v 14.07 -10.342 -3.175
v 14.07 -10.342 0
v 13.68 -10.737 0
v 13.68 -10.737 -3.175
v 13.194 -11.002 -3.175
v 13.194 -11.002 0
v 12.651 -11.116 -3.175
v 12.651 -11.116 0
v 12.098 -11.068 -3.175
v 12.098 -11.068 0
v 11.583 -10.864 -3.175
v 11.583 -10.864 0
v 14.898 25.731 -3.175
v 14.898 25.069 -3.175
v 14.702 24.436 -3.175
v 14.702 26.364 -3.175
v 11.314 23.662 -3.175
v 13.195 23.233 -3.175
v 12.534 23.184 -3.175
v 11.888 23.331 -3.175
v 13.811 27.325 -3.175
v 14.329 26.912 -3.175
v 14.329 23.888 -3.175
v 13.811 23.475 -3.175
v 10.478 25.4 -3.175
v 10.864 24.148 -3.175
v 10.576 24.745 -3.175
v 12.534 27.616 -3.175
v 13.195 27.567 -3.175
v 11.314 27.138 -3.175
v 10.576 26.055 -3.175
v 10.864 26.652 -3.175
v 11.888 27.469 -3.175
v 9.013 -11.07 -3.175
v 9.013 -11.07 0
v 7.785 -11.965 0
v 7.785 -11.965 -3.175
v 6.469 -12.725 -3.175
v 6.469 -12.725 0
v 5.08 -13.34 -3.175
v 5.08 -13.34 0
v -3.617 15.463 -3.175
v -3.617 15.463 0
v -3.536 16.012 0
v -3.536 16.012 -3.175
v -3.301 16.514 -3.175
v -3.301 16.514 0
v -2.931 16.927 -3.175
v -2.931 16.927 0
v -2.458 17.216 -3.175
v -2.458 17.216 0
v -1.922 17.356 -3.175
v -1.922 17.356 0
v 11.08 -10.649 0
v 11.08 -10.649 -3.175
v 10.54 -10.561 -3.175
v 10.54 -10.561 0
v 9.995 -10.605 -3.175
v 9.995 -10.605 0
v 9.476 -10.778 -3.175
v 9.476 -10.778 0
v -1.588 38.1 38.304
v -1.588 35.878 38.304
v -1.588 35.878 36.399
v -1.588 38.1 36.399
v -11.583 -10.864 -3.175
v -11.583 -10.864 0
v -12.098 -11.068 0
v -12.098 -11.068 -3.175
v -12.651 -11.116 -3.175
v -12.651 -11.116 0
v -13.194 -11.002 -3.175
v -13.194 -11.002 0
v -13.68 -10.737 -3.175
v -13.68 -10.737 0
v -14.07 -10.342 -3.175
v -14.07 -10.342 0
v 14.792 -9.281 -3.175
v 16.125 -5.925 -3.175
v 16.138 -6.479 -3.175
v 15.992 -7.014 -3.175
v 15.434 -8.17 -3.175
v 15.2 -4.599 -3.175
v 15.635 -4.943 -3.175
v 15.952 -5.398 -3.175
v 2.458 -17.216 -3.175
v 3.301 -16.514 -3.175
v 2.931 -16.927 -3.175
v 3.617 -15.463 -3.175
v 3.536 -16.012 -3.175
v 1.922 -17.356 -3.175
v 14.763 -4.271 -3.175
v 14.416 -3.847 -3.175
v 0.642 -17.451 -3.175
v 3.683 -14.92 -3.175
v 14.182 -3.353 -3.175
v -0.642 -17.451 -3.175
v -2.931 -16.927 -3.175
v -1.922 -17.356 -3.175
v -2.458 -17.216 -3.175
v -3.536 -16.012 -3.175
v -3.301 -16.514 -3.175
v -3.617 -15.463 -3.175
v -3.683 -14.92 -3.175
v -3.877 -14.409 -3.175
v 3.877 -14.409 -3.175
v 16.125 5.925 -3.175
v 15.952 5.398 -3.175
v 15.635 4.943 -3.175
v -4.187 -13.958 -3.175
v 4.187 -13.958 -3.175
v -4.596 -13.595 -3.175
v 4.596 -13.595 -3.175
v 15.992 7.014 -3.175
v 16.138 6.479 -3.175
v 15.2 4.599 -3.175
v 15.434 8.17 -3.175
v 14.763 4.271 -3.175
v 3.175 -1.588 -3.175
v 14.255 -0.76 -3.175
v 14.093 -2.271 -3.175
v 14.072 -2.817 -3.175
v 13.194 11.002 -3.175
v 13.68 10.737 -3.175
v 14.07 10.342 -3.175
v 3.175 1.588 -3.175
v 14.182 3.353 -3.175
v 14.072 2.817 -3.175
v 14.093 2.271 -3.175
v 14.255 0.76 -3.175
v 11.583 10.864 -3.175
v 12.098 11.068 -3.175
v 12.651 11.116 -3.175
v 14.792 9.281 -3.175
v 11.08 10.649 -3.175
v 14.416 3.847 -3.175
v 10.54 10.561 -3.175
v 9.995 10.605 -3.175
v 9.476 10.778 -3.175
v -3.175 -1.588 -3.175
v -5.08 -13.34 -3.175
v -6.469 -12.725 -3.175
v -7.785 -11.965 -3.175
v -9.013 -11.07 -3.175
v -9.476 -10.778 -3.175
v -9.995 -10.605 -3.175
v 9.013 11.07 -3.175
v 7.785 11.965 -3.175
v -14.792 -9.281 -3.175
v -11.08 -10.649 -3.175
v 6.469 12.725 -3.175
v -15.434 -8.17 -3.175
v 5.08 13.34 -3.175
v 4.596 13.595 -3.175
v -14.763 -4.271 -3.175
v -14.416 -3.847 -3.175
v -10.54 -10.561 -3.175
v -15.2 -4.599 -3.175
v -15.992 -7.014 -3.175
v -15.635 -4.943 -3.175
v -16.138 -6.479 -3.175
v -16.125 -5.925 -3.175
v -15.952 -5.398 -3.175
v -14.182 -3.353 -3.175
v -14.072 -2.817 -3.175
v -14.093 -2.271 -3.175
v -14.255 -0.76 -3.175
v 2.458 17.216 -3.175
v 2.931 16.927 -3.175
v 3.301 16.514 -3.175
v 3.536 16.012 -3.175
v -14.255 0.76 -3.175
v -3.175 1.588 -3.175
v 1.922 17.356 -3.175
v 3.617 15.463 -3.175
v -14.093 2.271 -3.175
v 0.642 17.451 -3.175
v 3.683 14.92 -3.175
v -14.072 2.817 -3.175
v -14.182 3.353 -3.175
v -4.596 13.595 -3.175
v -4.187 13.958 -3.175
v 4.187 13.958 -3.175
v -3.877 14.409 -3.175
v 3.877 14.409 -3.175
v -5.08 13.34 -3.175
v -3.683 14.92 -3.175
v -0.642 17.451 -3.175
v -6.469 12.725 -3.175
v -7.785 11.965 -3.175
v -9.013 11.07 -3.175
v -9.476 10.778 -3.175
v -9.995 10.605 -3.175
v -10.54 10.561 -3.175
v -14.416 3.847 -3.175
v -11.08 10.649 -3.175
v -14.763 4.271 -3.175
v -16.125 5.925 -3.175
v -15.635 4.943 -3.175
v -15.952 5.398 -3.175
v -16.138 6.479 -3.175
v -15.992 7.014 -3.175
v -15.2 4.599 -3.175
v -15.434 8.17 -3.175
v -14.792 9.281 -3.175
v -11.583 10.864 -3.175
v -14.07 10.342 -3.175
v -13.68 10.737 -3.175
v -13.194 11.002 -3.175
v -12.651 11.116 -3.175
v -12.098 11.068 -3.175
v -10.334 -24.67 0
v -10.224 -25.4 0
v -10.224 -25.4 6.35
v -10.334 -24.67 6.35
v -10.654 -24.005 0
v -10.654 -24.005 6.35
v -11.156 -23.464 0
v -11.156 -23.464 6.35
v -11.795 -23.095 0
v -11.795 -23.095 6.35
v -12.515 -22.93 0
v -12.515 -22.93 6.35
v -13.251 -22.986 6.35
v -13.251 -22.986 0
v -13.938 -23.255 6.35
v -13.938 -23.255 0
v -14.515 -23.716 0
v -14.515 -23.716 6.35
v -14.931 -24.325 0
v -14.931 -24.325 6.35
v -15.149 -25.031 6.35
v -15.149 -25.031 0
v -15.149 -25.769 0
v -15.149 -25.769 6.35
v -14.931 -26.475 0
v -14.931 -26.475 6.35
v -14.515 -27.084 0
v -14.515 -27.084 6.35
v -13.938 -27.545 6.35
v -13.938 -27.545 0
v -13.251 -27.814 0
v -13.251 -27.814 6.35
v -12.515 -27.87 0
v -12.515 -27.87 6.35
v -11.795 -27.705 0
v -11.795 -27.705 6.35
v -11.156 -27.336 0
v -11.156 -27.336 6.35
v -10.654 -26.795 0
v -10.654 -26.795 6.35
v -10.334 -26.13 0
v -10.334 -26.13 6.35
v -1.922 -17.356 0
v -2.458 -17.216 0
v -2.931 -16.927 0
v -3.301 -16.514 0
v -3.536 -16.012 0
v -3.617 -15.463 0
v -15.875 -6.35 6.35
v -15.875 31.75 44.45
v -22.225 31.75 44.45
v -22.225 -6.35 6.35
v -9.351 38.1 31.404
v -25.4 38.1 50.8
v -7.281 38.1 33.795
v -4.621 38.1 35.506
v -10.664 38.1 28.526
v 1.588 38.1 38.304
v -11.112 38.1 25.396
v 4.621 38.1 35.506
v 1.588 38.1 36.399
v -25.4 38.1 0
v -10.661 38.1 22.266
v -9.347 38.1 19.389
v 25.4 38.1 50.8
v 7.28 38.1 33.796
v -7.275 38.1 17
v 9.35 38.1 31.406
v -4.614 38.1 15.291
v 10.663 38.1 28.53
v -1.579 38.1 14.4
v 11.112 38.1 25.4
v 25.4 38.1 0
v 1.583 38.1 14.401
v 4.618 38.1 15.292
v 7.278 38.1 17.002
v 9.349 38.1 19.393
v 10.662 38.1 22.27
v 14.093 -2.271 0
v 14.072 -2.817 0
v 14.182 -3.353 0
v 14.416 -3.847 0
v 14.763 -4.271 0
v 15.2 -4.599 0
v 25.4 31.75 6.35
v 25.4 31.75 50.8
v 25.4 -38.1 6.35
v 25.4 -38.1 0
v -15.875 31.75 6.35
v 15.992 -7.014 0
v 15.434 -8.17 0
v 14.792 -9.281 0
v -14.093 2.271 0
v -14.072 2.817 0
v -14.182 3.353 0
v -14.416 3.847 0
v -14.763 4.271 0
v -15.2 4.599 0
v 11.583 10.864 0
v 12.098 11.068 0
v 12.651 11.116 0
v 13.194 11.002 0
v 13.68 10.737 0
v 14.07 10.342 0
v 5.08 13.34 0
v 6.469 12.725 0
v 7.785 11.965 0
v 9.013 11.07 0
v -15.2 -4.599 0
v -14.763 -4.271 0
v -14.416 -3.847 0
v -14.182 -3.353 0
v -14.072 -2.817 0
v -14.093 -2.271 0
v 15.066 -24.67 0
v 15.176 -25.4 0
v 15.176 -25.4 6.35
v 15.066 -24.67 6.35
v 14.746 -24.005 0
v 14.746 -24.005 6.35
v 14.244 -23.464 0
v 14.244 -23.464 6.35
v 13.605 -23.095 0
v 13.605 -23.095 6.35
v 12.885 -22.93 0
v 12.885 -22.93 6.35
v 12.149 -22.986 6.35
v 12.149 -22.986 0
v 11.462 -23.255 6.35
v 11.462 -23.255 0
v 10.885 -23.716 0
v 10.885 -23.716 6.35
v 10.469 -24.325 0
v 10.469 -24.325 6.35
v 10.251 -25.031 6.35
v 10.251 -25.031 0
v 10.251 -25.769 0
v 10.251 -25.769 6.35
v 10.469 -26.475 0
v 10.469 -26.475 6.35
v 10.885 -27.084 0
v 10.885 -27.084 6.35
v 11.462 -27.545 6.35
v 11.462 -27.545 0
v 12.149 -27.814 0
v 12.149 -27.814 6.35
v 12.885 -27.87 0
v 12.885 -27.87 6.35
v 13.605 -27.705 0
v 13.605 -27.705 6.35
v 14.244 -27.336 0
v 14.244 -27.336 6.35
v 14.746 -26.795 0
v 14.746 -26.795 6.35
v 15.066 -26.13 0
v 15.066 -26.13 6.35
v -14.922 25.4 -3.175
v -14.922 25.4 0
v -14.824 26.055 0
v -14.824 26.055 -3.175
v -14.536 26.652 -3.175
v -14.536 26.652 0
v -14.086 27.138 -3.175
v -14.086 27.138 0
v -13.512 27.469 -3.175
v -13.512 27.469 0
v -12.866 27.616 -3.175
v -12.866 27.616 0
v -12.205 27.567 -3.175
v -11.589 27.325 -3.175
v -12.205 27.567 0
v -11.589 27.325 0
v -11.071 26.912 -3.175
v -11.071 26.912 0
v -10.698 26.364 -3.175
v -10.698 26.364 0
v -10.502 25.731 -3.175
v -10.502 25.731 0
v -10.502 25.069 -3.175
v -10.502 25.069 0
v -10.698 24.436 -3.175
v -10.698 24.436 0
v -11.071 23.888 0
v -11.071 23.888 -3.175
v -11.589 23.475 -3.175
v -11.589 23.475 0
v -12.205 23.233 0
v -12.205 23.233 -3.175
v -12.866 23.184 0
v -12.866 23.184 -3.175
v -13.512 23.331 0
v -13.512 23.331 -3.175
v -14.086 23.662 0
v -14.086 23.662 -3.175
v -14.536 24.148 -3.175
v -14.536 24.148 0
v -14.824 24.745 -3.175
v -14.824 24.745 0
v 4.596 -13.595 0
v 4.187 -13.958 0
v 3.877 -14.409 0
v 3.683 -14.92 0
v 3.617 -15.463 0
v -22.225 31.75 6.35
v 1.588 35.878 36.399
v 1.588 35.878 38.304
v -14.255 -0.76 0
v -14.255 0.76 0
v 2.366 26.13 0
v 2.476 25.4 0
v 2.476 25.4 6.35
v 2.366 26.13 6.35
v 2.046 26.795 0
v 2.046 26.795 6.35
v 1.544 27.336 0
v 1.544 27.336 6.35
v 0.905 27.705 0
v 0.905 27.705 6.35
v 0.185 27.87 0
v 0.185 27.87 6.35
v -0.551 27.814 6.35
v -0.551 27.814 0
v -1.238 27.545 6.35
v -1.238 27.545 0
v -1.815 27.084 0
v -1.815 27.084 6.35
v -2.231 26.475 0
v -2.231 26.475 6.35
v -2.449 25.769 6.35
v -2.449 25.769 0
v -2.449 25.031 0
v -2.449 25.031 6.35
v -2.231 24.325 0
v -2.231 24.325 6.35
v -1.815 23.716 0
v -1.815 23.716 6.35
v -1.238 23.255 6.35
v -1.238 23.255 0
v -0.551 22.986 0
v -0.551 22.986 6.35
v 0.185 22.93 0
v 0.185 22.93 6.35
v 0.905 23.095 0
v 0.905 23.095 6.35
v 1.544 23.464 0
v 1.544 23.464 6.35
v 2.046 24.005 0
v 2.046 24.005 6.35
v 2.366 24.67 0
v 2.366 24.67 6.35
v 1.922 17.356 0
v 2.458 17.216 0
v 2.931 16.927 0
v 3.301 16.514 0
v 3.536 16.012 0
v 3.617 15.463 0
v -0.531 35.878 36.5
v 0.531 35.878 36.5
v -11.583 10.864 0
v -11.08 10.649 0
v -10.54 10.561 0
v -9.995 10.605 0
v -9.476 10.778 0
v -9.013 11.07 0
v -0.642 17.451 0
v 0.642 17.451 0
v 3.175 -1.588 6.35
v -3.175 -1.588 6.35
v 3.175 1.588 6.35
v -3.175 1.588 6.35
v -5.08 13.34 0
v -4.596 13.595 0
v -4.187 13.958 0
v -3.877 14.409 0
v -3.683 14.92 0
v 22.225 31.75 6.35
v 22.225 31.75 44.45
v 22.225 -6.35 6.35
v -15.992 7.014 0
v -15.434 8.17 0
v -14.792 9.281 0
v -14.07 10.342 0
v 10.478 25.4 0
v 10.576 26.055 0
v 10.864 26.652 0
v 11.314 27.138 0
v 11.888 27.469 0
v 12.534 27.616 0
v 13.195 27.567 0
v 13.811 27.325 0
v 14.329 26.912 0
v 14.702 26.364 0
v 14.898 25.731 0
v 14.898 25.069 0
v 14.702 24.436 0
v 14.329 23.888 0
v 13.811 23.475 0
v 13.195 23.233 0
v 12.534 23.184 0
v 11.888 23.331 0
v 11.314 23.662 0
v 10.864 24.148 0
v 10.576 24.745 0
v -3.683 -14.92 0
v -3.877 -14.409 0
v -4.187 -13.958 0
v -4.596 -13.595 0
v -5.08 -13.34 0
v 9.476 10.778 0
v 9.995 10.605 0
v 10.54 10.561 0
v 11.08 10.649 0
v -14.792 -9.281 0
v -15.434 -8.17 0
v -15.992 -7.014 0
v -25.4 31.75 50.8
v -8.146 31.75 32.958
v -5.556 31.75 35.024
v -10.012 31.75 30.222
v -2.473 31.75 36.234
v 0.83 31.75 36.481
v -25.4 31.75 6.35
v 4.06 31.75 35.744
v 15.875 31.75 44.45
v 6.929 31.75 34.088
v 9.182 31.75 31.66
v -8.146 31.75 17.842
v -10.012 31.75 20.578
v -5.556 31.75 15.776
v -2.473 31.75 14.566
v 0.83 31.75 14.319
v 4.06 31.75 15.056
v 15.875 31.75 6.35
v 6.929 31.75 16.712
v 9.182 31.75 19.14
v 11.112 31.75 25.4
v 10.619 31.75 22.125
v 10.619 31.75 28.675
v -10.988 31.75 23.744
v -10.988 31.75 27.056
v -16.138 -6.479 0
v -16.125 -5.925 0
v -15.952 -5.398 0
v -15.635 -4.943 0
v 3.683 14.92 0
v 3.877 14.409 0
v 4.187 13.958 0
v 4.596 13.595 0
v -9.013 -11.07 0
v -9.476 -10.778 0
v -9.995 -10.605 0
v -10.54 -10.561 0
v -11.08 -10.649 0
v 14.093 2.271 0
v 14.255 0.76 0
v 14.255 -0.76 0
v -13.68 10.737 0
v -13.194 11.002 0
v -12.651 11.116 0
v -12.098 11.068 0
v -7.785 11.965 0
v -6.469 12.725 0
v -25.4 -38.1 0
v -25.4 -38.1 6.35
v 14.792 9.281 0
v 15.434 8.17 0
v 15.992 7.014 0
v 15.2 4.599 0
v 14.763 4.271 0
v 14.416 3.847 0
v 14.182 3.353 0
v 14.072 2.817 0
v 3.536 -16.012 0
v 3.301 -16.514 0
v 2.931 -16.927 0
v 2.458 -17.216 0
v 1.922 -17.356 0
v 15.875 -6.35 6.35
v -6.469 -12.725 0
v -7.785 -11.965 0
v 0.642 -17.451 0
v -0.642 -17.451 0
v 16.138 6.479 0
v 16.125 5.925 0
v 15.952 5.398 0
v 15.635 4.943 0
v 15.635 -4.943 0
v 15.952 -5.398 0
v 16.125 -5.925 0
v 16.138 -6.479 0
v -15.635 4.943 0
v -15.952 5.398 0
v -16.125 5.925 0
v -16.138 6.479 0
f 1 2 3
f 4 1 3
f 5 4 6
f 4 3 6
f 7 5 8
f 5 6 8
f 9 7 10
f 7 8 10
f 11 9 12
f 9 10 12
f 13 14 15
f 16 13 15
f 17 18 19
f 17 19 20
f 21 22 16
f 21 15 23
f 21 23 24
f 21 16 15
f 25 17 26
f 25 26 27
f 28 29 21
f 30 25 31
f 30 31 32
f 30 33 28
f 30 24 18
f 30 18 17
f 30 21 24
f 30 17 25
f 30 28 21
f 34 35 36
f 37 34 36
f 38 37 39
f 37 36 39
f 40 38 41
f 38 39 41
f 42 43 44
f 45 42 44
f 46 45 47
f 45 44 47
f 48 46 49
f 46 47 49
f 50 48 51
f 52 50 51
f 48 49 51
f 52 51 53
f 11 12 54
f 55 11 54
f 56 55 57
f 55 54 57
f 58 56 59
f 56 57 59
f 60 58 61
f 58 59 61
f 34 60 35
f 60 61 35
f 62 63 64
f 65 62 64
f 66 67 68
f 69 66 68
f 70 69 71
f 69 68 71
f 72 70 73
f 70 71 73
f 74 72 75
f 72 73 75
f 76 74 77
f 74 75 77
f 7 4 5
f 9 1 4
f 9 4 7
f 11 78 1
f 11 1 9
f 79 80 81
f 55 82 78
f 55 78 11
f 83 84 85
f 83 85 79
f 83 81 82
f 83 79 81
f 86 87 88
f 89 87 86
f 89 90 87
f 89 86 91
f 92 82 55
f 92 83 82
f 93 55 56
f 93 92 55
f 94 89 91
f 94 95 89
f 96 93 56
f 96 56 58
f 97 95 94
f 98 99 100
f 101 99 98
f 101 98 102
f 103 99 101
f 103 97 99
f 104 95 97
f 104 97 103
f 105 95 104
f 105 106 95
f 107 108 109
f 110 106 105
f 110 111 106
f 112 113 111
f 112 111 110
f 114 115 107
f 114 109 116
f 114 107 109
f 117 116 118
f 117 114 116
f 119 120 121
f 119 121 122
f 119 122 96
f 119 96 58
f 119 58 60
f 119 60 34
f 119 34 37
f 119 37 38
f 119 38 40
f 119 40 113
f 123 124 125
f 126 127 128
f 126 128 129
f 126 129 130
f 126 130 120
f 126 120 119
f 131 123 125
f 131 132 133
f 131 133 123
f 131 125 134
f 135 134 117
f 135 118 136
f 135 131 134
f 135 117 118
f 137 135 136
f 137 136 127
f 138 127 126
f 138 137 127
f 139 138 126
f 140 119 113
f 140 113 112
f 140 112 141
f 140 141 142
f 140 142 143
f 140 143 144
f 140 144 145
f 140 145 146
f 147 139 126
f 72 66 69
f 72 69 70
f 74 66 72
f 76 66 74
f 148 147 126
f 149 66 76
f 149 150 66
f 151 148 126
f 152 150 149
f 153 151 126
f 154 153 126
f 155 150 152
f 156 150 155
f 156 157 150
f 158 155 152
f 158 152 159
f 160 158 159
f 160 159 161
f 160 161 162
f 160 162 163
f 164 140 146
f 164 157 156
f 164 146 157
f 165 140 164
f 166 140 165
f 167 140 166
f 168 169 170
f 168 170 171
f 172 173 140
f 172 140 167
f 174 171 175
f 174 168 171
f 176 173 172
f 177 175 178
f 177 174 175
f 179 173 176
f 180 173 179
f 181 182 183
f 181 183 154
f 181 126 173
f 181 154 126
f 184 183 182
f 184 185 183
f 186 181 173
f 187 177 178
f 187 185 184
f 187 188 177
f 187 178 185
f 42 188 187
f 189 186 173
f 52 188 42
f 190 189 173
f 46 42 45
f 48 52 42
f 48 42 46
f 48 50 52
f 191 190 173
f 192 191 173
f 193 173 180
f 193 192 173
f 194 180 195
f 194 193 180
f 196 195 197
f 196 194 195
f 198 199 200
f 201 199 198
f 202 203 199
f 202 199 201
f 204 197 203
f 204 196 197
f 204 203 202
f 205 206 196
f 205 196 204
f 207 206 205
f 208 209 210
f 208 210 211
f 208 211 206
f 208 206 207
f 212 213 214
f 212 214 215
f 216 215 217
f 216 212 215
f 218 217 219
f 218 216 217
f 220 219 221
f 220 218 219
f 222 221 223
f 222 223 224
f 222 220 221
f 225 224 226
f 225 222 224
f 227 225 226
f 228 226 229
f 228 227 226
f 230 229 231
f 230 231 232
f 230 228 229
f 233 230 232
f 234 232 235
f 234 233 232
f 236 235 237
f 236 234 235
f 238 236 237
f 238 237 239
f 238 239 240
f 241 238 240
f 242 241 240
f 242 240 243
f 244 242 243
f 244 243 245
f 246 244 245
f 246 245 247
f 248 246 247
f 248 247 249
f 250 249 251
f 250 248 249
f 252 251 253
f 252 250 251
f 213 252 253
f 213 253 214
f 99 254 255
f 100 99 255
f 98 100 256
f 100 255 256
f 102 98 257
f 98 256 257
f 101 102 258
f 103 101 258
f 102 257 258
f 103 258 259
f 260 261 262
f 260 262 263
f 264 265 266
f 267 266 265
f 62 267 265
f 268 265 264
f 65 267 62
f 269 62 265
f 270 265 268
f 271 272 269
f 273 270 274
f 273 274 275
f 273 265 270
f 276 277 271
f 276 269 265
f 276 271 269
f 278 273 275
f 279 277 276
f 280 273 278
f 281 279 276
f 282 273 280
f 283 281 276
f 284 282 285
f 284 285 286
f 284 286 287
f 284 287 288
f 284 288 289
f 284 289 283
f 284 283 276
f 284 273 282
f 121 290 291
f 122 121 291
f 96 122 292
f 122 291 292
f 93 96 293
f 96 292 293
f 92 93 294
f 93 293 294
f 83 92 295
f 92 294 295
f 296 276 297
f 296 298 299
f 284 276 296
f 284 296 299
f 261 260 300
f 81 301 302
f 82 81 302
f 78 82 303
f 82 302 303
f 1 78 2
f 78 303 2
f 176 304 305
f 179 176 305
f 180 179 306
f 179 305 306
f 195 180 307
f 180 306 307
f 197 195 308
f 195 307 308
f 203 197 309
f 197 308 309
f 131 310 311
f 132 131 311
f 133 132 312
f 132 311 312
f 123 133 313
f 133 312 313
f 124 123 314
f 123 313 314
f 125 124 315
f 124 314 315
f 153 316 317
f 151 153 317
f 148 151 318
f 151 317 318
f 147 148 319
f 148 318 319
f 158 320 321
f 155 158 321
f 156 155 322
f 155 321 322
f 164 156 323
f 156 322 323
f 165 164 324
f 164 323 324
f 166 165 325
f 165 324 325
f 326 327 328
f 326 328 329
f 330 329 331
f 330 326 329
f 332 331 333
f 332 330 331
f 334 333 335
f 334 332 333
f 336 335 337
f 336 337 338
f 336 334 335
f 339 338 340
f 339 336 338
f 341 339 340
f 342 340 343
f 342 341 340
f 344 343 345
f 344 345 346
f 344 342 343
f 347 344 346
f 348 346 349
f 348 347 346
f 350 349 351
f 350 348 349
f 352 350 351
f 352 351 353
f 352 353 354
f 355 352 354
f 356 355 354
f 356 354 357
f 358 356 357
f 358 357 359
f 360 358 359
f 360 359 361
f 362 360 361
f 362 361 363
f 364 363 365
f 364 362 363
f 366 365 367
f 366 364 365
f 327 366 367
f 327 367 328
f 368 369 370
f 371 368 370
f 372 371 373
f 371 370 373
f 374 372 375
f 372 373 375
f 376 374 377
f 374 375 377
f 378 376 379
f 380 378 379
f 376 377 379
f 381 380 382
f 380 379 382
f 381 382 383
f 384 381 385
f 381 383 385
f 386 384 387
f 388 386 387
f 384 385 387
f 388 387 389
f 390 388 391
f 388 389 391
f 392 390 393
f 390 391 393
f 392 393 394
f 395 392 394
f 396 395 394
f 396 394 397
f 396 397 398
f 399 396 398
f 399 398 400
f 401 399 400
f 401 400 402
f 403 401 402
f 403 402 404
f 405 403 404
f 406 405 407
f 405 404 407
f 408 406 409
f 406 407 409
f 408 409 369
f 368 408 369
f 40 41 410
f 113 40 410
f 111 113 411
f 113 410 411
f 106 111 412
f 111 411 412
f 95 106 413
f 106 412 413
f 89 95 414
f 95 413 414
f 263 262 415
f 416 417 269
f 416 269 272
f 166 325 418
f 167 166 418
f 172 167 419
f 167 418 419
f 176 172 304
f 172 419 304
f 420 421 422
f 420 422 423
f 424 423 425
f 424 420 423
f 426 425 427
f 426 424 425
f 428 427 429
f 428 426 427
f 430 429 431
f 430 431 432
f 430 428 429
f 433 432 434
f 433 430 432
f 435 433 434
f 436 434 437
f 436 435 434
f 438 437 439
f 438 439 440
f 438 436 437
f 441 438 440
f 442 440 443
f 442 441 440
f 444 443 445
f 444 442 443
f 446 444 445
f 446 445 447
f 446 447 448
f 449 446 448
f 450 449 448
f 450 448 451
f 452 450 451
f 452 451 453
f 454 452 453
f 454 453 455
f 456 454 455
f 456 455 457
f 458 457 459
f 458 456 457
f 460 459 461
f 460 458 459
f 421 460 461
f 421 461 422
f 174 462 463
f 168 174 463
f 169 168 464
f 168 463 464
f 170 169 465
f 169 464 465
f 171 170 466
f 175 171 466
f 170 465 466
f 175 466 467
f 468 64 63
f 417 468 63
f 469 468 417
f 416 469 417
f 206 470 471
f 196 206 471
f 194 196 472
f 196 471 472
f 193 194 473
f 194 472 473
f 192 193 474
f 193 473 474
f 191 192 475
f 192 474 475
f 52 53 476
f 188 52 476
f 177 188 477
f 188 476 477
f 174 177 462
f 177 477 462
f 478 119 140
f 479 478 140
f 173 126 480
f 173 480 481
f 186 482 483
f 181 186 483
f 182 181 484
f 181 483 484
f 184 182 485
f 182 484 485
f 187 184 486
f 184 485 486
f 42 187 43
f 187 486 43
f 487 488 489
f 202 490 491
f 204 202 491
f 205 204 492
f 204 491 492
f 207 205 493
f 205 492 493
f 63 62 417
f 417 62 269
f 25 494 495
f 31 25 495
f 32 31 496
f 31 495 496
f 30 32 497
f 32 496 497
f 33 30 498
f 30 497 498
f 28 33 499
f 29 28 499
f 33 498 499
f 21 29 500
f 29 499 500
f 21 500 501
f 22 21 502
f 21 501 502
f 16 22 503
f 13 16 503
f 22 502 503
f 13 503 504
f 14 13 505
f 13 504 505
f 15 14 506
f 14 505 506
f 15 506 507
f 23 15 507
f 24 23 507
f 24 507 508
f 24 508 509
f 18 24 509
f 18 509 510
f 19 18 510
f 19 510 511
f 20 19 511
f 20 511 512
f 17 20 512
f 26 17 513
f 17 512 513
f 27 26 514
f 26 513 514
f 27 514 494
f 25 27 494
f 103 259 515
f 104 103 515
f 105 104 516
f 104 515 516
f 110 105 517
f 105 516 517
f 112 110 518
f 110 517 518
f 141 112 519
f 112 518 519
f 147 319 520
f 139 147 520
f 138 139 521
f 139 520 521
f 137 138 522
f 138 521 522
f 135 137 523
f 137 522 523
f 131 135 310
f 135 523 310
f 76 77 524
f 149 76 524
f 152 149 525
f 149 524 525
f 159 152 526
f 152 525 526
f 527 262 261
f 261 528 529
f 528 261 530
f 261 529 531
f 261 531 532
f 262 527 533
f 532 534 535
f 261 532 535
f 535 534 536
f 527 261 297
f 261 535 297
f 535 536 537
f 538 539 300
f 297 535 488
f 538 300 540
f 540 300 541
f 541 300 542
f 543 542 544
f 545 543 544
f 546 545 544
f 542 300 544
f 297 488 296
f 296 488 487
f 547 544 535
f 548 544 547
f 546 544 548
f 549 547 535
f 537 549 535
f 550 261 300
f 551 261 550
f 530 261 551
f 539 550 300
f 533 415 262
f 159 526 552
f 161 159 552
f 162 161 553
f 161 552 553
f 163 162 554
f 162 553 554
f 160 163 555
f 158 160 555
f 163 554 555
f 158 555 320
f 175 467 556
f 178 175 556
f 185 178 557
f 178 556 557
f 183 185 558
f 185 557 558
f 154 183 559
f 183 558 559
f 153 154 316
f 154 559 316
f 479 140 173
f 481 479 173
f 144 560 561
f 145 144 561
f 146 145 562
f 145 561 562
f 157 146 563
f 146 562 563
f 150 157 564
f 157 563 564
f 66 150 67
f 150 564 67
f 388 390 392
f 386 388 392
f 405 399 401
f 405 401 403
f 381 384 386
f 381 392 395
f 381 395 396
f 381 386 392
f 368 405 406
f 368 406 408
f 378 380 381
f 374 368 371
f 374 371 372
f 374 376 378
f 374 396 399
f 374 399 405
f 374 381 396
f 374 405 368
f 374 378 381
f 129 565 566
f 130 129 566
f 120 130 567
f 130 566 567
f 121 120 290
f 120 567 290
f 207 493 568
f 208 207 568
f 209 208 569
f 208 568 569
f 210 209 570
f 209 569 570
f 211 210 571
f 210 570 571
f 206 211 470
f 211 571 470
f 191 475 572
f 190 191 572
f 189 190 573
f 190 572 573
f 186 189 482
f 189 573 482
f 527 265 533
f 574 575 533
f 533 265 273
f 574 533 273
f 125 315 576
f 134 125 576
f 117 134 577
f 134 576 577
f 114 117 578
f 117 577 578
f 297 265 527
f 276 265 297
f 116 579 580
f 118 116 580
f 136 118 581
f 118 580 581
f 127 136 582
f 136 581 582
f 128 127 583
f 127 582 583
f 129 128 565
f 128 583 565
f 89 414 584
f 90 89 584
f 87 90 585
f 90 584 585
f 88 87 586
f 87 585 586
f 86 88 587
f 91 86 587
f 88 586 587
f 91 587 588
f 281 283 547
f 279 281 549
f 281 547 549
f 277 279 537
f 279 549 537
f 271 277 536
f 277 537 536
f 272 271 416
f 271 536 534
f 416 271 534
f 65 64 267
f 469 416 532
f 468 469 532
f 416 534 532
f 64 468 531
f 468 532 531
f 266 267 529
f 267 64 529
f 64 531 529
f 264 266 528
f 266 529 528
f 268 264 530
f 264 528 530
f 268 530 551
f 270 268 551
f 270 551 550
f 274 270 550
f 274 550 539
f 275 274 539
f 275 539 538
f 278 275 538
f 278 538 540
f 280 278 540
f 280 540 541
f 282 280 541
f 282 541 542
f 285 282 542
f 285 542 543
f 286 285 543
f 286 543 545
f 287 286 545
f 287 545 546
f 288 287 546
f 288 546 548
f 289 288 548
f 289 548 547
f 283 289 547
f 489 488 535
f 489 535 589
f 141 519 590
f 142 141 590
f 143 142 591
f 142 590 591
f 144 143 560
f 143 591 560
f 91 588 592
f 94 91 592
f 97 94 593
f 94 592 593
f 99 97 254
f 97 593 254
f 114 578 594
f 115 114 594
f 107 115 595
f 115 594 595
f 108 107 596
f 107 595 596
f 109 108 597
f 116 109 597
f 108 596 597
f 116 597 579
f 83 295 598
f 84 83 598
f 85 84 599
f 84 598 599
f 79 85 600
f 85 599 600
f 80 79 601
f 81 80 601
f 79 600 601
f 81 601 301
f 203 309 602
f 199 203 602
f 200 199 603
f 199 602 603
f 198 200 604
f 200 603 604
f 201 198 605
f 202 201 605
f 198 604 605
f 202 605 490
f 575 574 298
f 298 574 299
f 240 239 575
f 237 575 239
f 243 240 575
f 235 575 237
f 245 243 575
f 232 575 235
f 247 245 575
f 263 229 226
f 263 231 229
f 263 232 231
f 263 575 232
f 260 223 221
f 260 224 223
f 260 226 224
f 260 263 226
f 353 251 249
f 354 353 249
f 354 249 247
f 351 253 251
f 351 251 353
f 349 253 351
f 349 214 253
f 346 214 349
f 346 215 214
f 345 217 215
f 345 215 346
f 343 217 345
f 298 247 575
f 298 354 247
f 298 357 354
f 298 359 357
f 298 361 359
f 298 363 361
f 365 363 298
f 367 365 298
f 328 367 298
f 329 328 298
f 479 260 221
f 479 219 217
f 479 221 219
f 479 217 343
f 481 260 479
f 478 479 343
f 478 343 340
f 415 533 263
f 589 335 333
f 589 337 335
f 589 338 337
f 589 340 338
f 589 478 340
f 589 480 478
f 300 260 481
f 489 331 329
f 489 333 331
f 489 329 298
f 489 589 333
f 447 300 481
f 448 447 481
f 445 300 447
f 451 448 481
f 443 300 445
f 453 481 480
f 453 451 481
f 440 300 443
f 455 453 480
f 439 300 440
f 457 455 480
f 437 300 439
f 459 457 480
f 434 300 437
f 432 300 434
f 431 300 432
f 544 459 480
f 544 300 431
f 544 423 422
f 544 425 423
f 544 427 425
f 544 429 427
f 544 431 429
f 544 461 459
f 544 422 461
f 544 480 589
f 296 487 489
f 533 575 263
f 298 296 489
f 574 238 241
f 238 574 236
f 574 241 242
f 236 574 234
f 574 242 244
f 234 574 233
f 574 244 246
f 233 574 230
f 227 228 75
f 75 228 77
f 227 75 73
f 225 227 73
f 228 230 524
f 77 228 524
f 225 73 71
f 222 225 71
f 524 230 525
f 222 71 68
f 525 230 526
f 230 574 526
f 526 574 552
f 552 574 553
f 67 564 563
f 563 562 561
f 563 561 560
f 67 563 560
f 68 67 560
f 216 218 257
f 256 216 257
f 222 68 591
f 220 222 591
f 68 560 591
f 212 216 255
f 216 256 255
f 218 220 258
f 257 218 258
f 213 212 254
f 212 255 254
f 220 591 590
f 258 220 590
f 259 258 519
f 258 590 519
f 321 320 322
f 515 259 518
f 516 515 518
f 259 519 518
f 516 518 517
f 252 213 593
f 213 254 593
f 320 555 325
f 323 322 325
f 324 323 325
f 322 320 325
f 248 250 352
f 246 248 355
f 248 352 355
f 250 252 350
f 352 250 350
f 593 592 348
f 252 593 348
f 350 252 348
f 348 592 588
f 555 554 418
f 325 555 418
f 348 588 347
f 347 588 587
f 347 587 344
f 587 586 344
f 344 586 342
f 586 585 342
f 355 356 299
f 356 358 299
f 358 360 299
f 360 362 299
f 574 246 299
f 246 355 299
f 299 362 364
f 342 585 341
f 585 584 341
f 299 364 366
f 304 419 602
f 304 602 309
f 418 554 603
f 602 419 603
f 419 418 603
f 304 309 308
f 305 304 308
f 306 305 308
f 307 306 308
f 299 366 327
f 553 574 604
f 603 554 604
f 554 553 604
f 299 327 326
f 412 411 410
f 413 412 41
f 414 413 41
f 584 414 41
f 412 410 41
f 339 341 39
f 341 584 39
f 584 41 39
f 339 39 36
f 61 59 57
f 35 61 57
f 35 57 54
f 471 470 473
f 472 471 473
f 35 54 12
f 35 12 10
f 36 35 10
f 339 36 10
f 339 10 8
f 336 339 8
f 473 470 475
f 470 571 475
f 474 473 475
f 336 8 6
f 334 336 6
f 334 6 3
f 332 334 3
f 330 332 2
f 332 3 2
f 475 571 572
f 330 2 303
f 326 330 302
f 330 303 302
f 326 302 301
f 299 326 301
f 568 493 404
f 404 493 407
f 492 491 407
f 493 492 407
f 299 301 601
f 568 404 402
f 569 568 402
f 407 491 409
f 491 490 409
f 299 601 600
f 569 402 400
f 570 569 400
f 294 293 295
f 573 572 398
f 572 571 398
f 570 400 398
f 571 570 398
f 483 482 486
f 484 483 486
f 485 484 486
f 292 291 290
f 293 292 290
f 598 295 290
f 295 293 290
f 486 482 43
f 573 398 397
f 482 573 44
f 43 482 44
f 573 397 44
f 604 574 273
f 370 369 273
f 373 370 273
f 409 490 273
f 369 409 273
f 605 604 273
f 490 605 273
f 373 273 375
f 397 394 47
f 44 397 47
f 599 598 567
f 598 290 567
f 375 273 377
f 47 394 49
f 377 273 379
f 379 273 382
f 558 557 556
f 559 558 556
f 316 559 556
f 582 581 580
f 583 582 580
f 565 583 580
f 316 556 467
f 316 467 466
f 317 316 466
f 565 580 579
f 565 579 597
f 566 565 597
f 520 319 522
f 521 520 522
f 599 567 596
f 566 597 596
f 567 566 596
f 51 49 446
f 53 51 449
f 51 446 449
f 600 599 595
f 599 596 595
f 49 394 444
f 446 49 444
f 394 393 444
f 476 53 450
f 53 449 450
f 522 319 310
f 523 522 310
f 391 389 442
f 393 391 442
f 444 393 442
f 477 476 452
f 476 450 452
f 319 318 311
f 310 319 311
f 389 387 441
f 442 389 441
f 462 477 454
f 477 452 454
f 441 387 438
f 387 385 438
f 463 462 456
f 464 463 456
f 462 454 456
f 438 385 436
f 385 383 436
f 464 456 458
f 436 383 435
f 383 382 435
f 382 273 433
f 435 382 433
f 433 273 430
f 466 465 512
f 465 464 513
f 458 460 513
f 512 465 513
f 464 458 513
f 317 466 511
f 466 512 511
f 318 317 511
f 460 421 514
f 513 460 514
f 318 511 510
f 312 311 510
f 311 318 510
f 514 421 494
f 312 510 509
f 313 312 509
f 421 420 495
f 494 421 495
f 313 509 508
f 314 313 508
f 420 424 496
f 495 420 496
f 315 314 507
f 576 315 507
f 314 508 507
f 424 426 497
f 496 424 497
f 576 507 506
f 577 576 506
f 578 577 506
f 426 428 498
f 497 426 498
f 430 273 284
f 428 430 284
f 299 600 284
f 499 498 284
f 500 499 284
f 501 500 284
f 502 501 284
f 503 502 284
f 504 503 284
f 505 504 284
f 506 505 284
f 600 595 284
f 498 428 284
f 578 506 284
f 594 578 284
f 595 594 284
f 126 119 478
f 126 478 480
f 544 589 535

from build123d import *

# Parameters (mm, degrees)
SKETCH1_W           = 50.8
SKETCH1_H           = 76.2
SKETCH1_R           = 2.4765
BOSS_EXTRUDE1_DEPTH = 6.35
SKETCH2_R           = 2.2225
BOSS_EXTRUDE2_DEPTH = 3.175
SKETCH3_W           = 6.35
SKETCH3_H           = 3.175
CUT_EXTRUDE1_DEPTH  = 10.525
SKETCH4_W           = 50.8
SKETCH4_H           = 44.45
BOSS_EXTRUDE3_DEPTH = 6.35
BOSS_EXTRUDE4_DEPTH = 22.225
SKETCH6_W           = 31.75
SKETCH6_H           = 38.1
CUT_EXTRUDE2_DEPTH  = 45.45
SKETCH7_R           = 11.1125
CUT_EXTRUDE3_DEPTH  = 7.35
SKETCH8_W           = 3.175
SKETCH8_H           = 1.905
CUT_EXTRUDE4_DEPTH  = 2.2225


with BuildPart() as part:
    # Sketch1 → Boss-Extrude1 (new body)
    with BuildSketch(Plane.XY):
        Rectangle(SKETCH1_W, SKETCH1_H)
        with Locations((-12.7, -25.4)):
            Circle(SKETCH1_R, mode=Mode.SUBTRACT)
        with Locations((12.7, -25.4)):
            Circle(SKETCH1_R, mode=Mode.SUBTRACT)
        with Locations((0, 25.4)):
            Circle(SKETCH1_R, mode=Mode.SUBTRACT)
    extrude(amount=BOSS_EXTRUDE1_DEPTH)

    # Sketch2 → Boss-Extrude2 (add)
    with BuildSketch(Plane(origin=(0, 0, 0), x_dir=(-1, 0, 0), z_dir=(0, 0, -1))):
        with Locations((-12.7, 25.4)):
            Circle(SKETCH2_R)
        with Locations((12.7, 25.4)):
            Circle(SKETCH2_R)
        with BuildLine():
            ThreePointArc((-5.08, 13.340296662), (-7.1374, 12.362339434), (-9.013035804, 11.069557382))
            ThreePointArc((-9.013035804, 11.069557382), (-10.265964814, 10.566776235), (-11.582919047, 10.863847829))
            ThreePointArc((-11.582919047, 10.863847829), (-12.926326796, 11.078530787), (-14.070368319, 10.342322835))
            ThreePointArc((-14.070368319, 10.342322835), (-15.122968614, 8.73125), (-15.991898469, 7.014134987))
            ThreePointArc((-15.991898469, 7.014134987), (-16.057452496, 5.65526199), (-15.199827727, 4.59917823))
            ThreePointArc((-15.199827727, 4.59917823), (-14.284079063, 3.607198205), (-14.093035804, 2.27073928))
            ThreePointArc((-14.093035804, 2.27073928), (-14.2748, 0), (-14.093035804, -2.27073928))
            ThreePointArc((-14.093035804, -2.27073928), (-14.284079063, -3.607198205), (-15.199827727, -4.59917823))
            ThreePointArc((-15.199827727, -4.59917823), (-16.057452496, -5.65526199), (-15.991898469, -7.014134987))
            ThreePointArc((-15.991898469, -7.014134987), (-15.122968614, -8.73125), (-14.070368319, -10.342322835))
            ThreePointArc((-14.070368319, -10.342322835), (-12.926326796, -11.078530787), (-11.582919047, -10.863847829))
            ThreePointArc((-11.582919047, -10.863847829), (-10.265964814, -10.566776235), (-9.013035804, -11.069557382))
            ThreePointArc((-9.013035804, -11.069557382), (-7.1374, -12.362339434), (-5.08, -13.340296662))
            ThreePointArc((-5.08, -13.340296662), (-4.018114249, -14.173974441), (-3.616908679, -15.46302606))
            ThreePointArc((-3.616908679, -15.46302606), (-3.1311257, -16.733792777), (-1.92153015, -17.356457822))
            ThreePointArc((-1.92153015, -17.356457822), (0, -17.4625), (1.92153015, -17.356457822))
            ThreePointArc((1.92153015, -17.356457822), (3.1311257, -16.733792777), (3.616908679, -15.46302606))
            ThreePointArc((3.616908679, -15.46302606), (4.018114249, -14.173974441), (5.08, -13.340296662))
            ThreePointArc((5.08, -13.340296662), (7.1374, -12.362339434), (9.013035804, -11.069557382))
            ThreePointArc((9.013035804, -11.069557382), (10.265964814, -10.566776235), (11.582919047, -10.863847829))
            ThreePointArc((11.582919047, -10.863847829), (12.926326796, -11.078530787), (14.070368319, -10.342322835))
            ThreePointArc((14.070368319, -10.342322835), (15.122968614, -8.73125), (15.991898469, -7.014134987))
            ThreePointArc((15.991898469, -7.014134987), (16.057452496, -5.65526199), (15.199827727, -4.59917823))
            ThreePointArc((15.199827727, -4.59917823), (14.284079063, -3.607198205), (14.093035804, -2.27073928))
            ThreePointArc((14.093035804, -2.27073928), (14.2748, 0), (14.093035804, 2.27073928))
            ThreePointArc((14.093035804, 2.27073928), (14.284079063, 3.607198205), (15.199827727, 4.59917823))
            ThreePointArc((15.199827727, 4.59917823), (16.057452496, 5.65526199), (15.991898469, 7.014134987))
            ThreePointArc((15.991898469, 7.014134987), (15.122968614, 8.73125), (14.070368319, 10.342322835))
            ThreePointArc((14.070368319, 10.342322835), (12.926326796, 11.078530787), (11.582919047, 10.863847829))
            ThreePointArc((11.582919047, 10.863847829), (10.265964814, 10.566776235), (9.013035804, 11.069557382))
            ThreePointArc((9.013035804, 11.069557382), (7.1374, 12.362339434), (5.08, 13.340296662))
            ThreePointArc((5.08, 13.340296662), (4.018114249, 14.173974441), (3.616908679, 15.46302606))
            ThreePointArc((3.616908679, 15.46302606), (3.1311257, 16.733792777), (1.92153015, 17.356457822))
            ThreePointArc((1.92153015, 17.356457822), (0, 17.4625), (-1.92153015, 17.356457822))
            ThreePointArc((-1.92153015, 17.356457822), (-3.1311257, 16.733792777), (-3.616908679, 15.46302606))
            ThreePointArc((-3.616908679, 15.46302606), (-4.018114249, 14.173974441), (-5.08, 13.340296662))
        make_face()
    extrude(amount=BOSS_EXTRUDE2_DEPTH)

    # Sketch3 → Cut-Extrude1 (cut, through all)
    with BuildSketch(Plane(origin=(0, 0, -3.175), x_dir=(-1, 0, 0), z_dir=(0, 0, -1))):
        Rectangle(SKETCH3_W, SKETCH3_H)
    extrude(amount=-CUT_EXTRUDE1_DEPTH, mode=Mode.SUBTRACT)

    # Sketch4 → Boss-Extrude3 (add)
    with BuildSketch(Plane(origin=(0, 38.1, 0), x_dir=(1, 0, 0), z_dir=(0, 1, 0))):
        with Locations((0, -28.575)):
            Rectangle(SKETCH4_W, SKETCH4_H)
    extrude(amount=-BOSS_EXTRUDE3_DEPTH)

    # Sketch5 → Boss-Extrude4 (add, symmetric)
    with BuildSketch(Plane(origin=(0, 0, 0), x_dir=(0, 0, -1), z_dir=(1, 0, 0))):
        Polygon((-44.45, 31.75), (-6.35, -6.35), (-6.35, 31.75), align=None)
    extrude(amount=BOSS_EXTRUDE4_DEPTH, both=True)

    # Sketch6 → Cut-Extrude2 (cut, through all)
    with BuildSketch(Plane.XY.offset(6.35)):
        with Locations((0, 12.7)):
            Rectangle(SKETCH6_W, SKETCH6_H)
    extrude(amount=CUT_EXTRUDE2_DEPTH, mode=Mode.SUBTRACT)

    # Sketch7 → Cut-Extrude3 (cut, through all)
    with BuildSketch(Plane.XZ.offset(-31.75)):
        with Locations((0, 25.4)):
            Circle(SKETCH7_R)
    extrude(amount=-CUT_EXTRUDE3_DEPTH, mode=Mode.SUBTRACT)

    # Sketch8 → Cut-Extrude4 (cut)
    with BuildSketch(Plane(origin=(0, 38.1, 0), x_dir=(1, 0, 0), z_dir=(0, 1, 0))):
        with Locations((0, -37.351022628)):
            Rectangle(SKETCH8_W, SKETCH8_H)
    extrude(amount=-CUT_EXTRUDE4_DEPTH, mode=Mode.SUBTRACT)


solid = part.part
